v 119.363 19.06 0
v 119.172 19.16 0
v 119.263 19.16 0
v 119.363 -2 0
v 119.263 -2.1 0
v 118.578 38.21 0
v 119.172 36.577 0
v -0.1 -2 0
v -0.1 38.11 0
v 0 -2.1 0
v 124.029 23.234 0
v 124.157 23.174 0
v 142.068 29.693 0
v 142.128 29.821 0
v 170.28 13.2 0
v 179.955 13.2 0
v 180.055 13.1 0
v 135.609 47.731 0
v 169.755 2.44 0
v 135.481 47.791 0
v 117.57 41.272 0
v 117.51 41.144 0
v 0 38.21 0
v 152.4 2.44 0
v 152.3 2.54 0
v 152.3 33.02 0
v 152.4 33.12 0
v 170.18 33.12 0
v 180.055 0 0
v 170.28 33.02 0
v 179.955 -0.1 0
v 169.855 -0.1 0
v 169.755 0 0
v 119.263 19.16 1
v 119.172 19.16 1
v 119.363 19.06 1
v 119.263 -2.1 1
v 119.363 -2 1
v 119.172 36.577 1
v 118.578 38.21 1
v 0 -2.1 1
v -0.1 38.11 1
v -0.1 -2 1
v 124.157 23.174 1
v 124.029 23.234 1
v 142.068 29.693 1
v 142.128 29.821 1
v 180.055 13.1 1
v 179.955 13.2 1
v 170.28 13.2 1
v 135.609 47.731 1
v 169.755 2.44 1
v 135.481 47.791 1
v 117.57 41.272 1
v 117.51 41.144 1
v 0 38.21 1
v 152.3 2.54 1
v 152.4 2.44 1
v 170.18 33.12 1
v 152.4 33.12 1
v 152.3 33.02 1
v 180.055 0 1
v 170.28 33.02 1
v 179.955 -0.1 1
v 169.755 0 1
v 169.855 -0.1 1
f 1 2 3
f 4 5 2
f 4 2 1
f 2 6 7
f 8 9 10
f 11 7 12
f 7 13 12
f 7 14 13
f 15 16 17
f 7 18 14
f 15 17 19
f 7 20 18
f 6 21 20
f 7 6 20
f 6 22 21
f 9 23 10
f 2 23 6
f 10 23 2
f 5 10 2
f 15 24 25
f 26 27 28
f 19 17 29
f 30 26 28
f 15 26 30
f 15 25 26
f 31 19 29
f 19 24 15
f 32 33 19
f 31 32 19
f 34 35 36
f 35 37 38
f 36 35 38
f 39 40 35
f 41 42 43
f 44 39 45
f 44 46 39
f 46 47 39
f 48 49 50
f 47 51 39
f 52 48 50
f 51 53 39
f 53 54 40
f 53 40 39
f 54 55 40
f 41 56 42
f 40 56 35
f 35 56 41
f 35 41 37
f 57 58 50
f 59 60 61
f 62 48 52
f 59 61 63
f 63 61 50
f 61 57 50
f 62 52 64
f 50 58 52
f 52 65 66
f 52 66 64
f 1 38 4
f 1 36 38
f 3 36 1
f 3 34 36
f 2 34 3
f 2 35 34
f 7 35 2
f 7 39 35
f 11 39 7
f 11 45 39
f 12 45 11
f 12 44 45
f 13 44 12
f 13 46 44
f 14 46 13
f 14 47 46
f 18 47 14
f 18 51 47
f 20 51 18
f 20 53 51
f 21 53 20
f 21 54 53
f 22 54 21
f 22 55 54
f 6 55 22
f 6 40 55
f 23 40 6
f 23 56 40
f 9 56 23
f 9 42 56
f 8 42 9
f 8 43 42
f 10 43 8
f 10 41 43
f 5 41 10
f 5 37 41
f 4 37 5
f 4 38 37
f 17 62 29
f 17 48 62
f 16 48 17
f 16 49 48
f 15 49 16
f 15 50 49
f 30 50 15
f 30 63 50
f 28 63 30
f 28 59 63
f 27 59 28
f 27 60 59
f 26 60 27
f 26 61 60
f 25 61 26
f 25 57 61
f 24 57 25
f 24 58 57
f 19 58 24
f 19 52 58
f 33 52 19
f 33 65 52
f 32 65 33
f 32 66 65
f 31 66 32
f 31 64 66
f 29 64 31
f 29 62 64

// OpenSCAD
// file: ../../../lib/circuits/helpers.scad
function bu(u) = u * 2.54;

module breadboard_row(number, orientation="vertical") {
  children();
  if(number > 1) {
    if(orientation == "vertical") {
      translate([0,bu(1),0])
        breadboard_row(number-1, orientation=orientation) {
          children();
        }
    } else {
      translate([bu(1),0,0])
        breadboard_row(number-1, orientation=orientation){
          children();
        }
    }
  }
}
// file: ../../../lib/switches/rgb.scad
include <../variables.scad>

module rgb_row_trace_connection(width, height, xpos, ypos, rgb, connections) {
  half_width = u_mm(width)/2;
  half_height = u_mm(height)/2;
  if(connections[3] == "connect") {
    translate([1-half_width,8.875,0]){
      circle(d=0.8,$fn=40);
      offset(0.4)
        polygon(points=[[0,-0.01],[0,0.01],[u_mm(-xpos)-2, u_mm(-ypos)+0.01],[u_mm(-xpos)-2, u_mm(-ypos)-0.01]]);
    }
    translate([1-half_width,4.9,0]){
      circle(d=0.8,$fn=40);
      offset(0.4)
        polygon(points=[[0,-0.01],[0,0.01],[u_mm(-xpos)-2, u_mm(-ypos)+0.01],[u_mm(-xpos)-2, u_mm(-ypos)-0.01]]);
    }
    translate([1-half_width,3.3,0]){
      circle(d=0.8,$fn=40);
      offset(0.4)
        polygon(points=[[0,-0.01],[0,0.01],[u_mm(-xpos)-2, u_mm(-ypos)+0.01],[u_mm(-xpos)-2, u_mm(-ypos)-0.01]]);
    }
  }
  if(connections[2] == "connect") {
    translate([half_width-1,8.875,0]) {
      circle(d=0.8,$fn=40);
    }
    translate([half_width-1,4.9,0]) {
      circle(d=0.8,$fn=40);
    }
    translate([half_width-1,3.3,0]){
      circle(d=0.8,$fn=40);
    }
  }
}

module rgb_pcb_drill(width=1, height=1, rgb=true, connections=["hole","hole","hole","hole"]) {
  half_width = u_mm(width)/2;
  half_height = u_mm(height)/2;
  translate([half_width,half_height,0]) {
    if(rgb == true) {
      // LED Hole
      translate([-1.875,3.4])
        square([3.75,3]);

      // LED D
      if(connections[3] == "hole")
        translate([1.3-half_width,8,0])
          circle(d=1,$fn=40);
      if(connections[2] == "hole")
        translate([half_width-1.3,8,0])
          circle(d=1,$fn=40);

      // LED G
      if(connections[3] == "hole")
        translate([1.3-half_width,5.4,0])
          circle(d=1,$fn=40);
      if(connections[2] == "hole")
        translate([half_width-1.3,5.4,0])
          circle(d=1,$fn=40);

      // LED V
      if(connections[3] == "hole")
        translate([1.3-half_width,2.8,0])
          circle(d=1,$fn=40);
      if(connections[2] == "hole")
        translate([half_width-1.3,2.8,0])
          circle(d=1,$fn=40);
    }

    children();
  }
}

module rgb_pcb_hole_traces(width=1, height=1, rgb=true, xpos=0, ypos=0, connections=["hole","hole","hole","hole"]) {
  half_width = u_mm(width)/2;
  half_height = u_mm(height)/2;
  translate([half_width,half_height,0]) {
    if(rgb == true) {
      // LED D
      if(connections[3] == "hole")
        translate([1.3-half_width,8,0])
          circle(d=2.5,$fn=40);
      if(connections[2] == "hole")
        translate([half_width-1.3,8,0])
          circle(d=2.5,$fn=40);

      // LED G
      if(connections[3] == "hole")
        translate([1.3-half_width,5.4,0])
          circle(d=2.5,$fn=40);
      if(connections[2] == "hole")
        translate([half_width-1.3,5.4,0])
          circle(d=2.5,$fn=40);

      // LED V
      if(connections[3] == "hole")
        translate([1.3-half_width,2.8,0])
          circle(d=2.5,$fn=40);
      if(connections[2] == "hole")
        translate([half_width-1.3,2.8,0])
          circle(d=2.5,$fn=40);
    }

    children();
  }
}

module rgb_pcb_traces(width=1, height=1, rgb=true, xpos=0, ypos=0, connections=["hole","hole","hole","hole"]) {
  half_width = u_mm(width)/2;
  half_height = u_mm(height)/2;
  rgb_pcb_hole_traces(width=width, height=height, rgb=rgb, connections=connections) {
    if(rgb == true) {
      rgb_row_trace_connection(width=width, height=height, xpos=xpos, ypos=ypos, rgb=rgb, connections=connections);
      v_left = connections[3] == "none" ? 1 : half_width-5;
      // LED G
      translate([1.25,5])
        square([2,2]);
      translate([2.7,8.5,0]) {
        length = connections[2] == "none" ? 2 : half_width-3.7; 
        square([length,0.75]);
      }
      translate([2.7,6.8])
        square([0.8,2.4]);
      translate([-3.5,6.2])
        square([7,0.8]);
      translate([-3.5,6.8])
        square([0.8,2.4]);
      translate([-4-v_left,8.5,0])
        square([v_left+1,0.75]);

      // LED D
      translate([-4-v_left,4.5,0])
        square([v_left,0.8]);
      translate([-4.5,4.5,0])
        square([0.8,1.3]);
      translate([-4.5,5,0])
        square([1.3,0.8]);
      translate([2,4,0])
        square([2,0.8]);
      translate([4,4,0])
        square([0.8,1.3]);
      translate([4,4.5,0]) {
        length = connections[2] == "none" ? 0 : half_width-5; 
        square([length,0.75]);
      }
      translate([-3.375,5])
        square([2,1.1]);
      translate([1.25,3.75])
        square([2,1.1]);

      // LED V
      v_right = connections[2] == "none" ? 0 : half_width-5.25;
      translate([-4-v_left,2.9,0])
        square([v_right+v_left+8.875,0.8]);
      translate([-3.375,3.5])
        square([2,1.35]);
    }

    children();
  }
}
// file: ../../../lib/switches/base.scad
include <../variables.scad>
include <rgb.scad>

// ["top", "bottom", "left", "right"]

module switch_row_trace_connection(width, height, xpos, ypos, rgb, connections) {
  half_width = u_mm(width)/2;
  half_height = u_mm(height)/2;
  if(connections[3] == "connect") {
    translate([1-half_width,-5.5,0]){
      circle(d=0.8,$fn=40);
      offset(0.4)
        polygon(points=[[0,-0.01],[0,0.01],[u_mm(-xpos)-2, u_mm(-ypos)+0.01],[u_mm(-xpos)-2, u_mm(-ypos)-0.01]]);
    }
  }
  if(connections[2] == "connect") {
    translate([half_width-1,-5.5,0]) {
      circle(d=0.8,$fn=40);
    }
  }
}

module switch_column_trace_connection(width, height, xpos, ypos, rgb, connections, last_xpos=0, last_ypos=0) {
  half_width = u_mm(width)/2;
  half_height = u_mm(height)/2;
  if(connections[1] == "connect") {
    translate([-u_mm((width-1)/2)-0.9,half_height-1,0]) {
      circle(d=0.8,$fn=40);
      offset(0.4)
        polygon(points=[[0,-0.01],[0,0.01],[u_mm((width-1)/2),0.01],[u_mm((width-1)/2),-0.01]]);
    }
  }
  if(connections[0] == "connect") {
    y_off = u_mm(ypos-last_ypos);
    x_off = u_mm(last_xpos-xpos);
    translate([-0.875,-1-y_off-half_height,0]) {
      offset(0.4)
        polygon(points=[[-0.01+x_off,0],[0.01+x_off,0],[0.01,2+y_off],[-0.01,2+y_off]]);
      translate([x_off-0.01,0]) {
        offset(0.4)
          polygon(points=[[0,-0.01],[0,0.01],[u_mm((width-1)/2)+1,0.01],[u_mm((width-1)/2)+1,-0.01]]);
      }
    }
  }
}

module switch_base_pcb_drill(width=1, height=1, rgb=true, single=true, connections=["hole","hole","hole","hole"]) {
  half_width = u_mm(width)/2;
  half_height = u_mm(height)/2;
  rgb_pcb_drill(width=width, height=height, rgb=rgb, connections=connections) {
    // Row
    if(connections[2] == "hole")
      translate([half_width-1.3,-5.5,0])
        circle(d=1,$fn=40);
    if(connections[3] == "hole")
      translate([1.3-half_width,-5.5,0])
        circle(d=1,$fn=40);

    // Column
    if(connections[1] == "hole")
      translate([-1,half_height-1.25,0])
        circle(d=1,$fn=40);
    if(connections[0] == "hole")
      translate([-1,1.25-half_height,0])
        circle(d=1,$fn=40);

    children();
  }
}

module switch_base_pcb_traces(width=1, height=1, rgb=true, xpos=0, ypos=0, connections=["hole","hole","hole","hole"], last_xpos=0, last_ypos=0, single=true) {
  half_width = u_mm(width)/2;
  half_height = u_mm(height)/2;
  rgb_pcb_traces(width=width, height=height, rgb=rgb, xpos=xpos, ypos=ypos, connections=connections) {
    switch_row_trace_connection(width, height, xpos, ypos, rgb, connections);
    if(single && !rgb)
      switch_column_trace_connection(width, height, xpos, ypos, rgb, connections, last_xpos=last_xpos, last_ypos=last_ypos);

    // Row
    if(connections[2] == "hole")
      translate([half_width-1.3,-5.5,0])
        circle(d=2.5,$fn=40);
    if(connections[3] == "hole")
      translate([1.3-half_width,-5.5,0])
        circle(d=2.5,$fn=40);

    // Column
    if(connections[1] == "hole")
      translate([-1,half_height-1.25,0])
        circle(d=2.4,$fn=40);
    if(connections[0] == "hole")
      translate([-1,1.25-half_height,0])
        circle(d=2.4,$fn=40);

    children();
  }
}

module switch_base_pcb_traces_bottom(width=1, height=1, rgb=true, xpos=0, ypos=0, connections=["hole","hole","hole","hole"], last_xpos=0, last_ypos=0) {
  half_width = u_mm(width)/2;
  half_height = u_mm(height)/2;
  rgb_pcb_hole_traces(width=width, height=height, rgb=rgb, connections=connections) {
    switch_column_trace_connection(width, height, xpos, ypos, rgb, connections, last_xpos=last_xpos, last_ypos=last_ypos);

    // Row
    if(connections[2] == "hole")
      translate([half_width-1.3,-5.5,0])
        circle(d=2.5,$fn=40);
    if(connections[3] == "hole")
      translate([1.3-half_width,-5.5,0])
        circle(d=2.5,$fn=40);

    // Column
    if(connections[1] == "hole")
      translate([-1,half_height-1.25,0])
        circle(d=2.5,$fn=40);
    if(connections[0] == "hole")
      translate([-1,1.25-half_height,0])
        circle(d=2.5,$fn=40);

    children();
  }
}
// file: ../../../lib/switches/footprints.scad
include <../variables.scad>
include <stabilizers.scad>

module pcb_switch_outline(width=1, height=1) {
  stab_extra = width >= 2 ? 2 : 0;
  translate([0,-stab_extra])
    square([u_mm(width)+0.01, u_mm(height)+0.01+stab_extra]);
}

module pcb_switch_space_outline(width=1, height=1, style="mx", cnc=false) {
  offset = height_for_style(style);
  stab_extra = width >= 2 ? 2 : 0;
  translate([-1,-1-stab_extra,2.834-offset])
    cube([u_mm(width) + 2, u_mm(height) + 2 + stab_extra, 1.166+offset]);
  translate([u_mm(width/2),u_mm(height/2)]) {
    translate([-7.5,-7.5,1.5-offset])
      cube([15,15,5]);
    translate([-7,-7,-10])
      cube([14,14,10]);
    translate([u_mm(-width/2)-0.5,u_mm(-height/2)-0.5,-20-offset])
      cube([u_mm(width)+1,u_mm(height)+1, 20]);
  }
  translate([hole_offset(width), hole_offset(height),-10])
    stab(width);
}
// file: ../../../lib/switches/stabilizers.scad
module stab_hole_render(distance){
  translate([14+distance+3.375,6.99,0]) {
    circle(d=3.175, $fn=40);
    translate([0,-15.24,0])
      circle(d=4.064, $fn=40);
  }
  translate([-6.75-distance+3.375,6.99,0]) {
    circle(d=3.175, $fn=40);
    translate([0,-15.24,0])
      circle(d=4.064, $fn=40);
  }
}

module stab_holes(width) {
  if (width >= 7) {
    stab_hole_render(39.6);
  } else if (width >= 6) {
    stab_hole_render(39.6);
  } else if(width >= 2) {
    stab_hole_render(1.6);
  }
}

module stab_render(distance, cnc=false, height=5.334) {
  translate([14+distance,1.47,0]){
    // Right Side Large Hole
    cube([6.75,12.3,10]);

    // Add 1/16" corner holes for milling
    if(cnc){
      translate([0.56,0.56,0])
        cylinder(h=10,d=1.59,$fn=20);
      translate([6.75-0.56,0.56,0])
        cylinder(h=10,d=1.59,$fn=20);
      translate([0.56,12.3-0.56,0])
        cylinder(h=10,d=1.59,$fn=20);
      translate([6.75-0.56,12.3-0.56,0])
        cylinder(h=10,d=1.59,$fn=20);
    }
    translate([5.75,3.23,0]){
      // Side hole for notch
      cube([1.825,3.175,10]);
      translate([1.825,1.59,0])
        if(cnc)
          resize([1.59,3.175,10])
            cylinder(h=10,d=1.59,$fn=20);
    }
    translate([1.725,11.3,0]){
      // Top Notch
      cube([3.3,2.2,10]);
      if(cnc)
        translate([1.65,2.2,0])
          resize([3.3,1,10])
            cylinder(h=10,d=1,$fn=20);
    }
    // Thin out for clip
    translate([-1,-1,10-height+1.5])
      cube([8.75,14.3,height-1.5]);
  }
  translate([-6.75-distance,1.47,0]){
    // Left Side Large Hole
    cube([6.75,12.3,10]);
    translate([-0.825,3.23,0]){
      // Side hole for notch
      cube([1.825,3.175,10]);
      if(cnc)
        translate([0,1.59,0])
          resize([1.59,3.175,10])
            cylinder(h=10,d=1.59,$fn=20);

    }
    translate([1.725,11.3,0]){
      // Top Notch
      cube([3.3,2.2,10]);
      if(cnc)
        translate([1.65,2.2,0])
          resize([3.3,1,10])
            cylinder(h=10,d=1,$fn=20);
    }
    if(cnc){
      translate([0.56,0.56,0])
        cylinder(h=10,d=1.59,$fn=20);
      translate([6.75-0.56,0.56,0])
        cylinder(h=10,d=1.59,$fn=20);
      translate([0.56,12.3-0.56,0])
        cylinder(h=10,d=1.59,$fn=20);
      translate([6.75-0.56,12.3-0.56,0])
        cylinder(h=10,d=1.59,$fn=20);
    }
    // Thin out for clip
    translate([-1,-1,10-height+1.5])
      cube([8.75,14.3,height-1.5]);
  }
  // Center shaft for bar
  translate([-distance-2,4.7,0]){
    cube([distance*2+20,4.6,10]);
  }
}

module stab(key_width, cnc=false) {
  if (key_width >= 7) {
    stab_render(39.6, cnc=cnc);
  } else if (key_width >= 6) {
    stab_render(39.6, cnc=cnc);
  } else if(key_width >= 2) {
    stab_render(1.6, cnc=cnc);
  }
}
// file: ../../../lib/circuits/wire.scad
module guage(guage=12) {
  fn=20;
  if(guage == 8) {
    circle(d=3.25, $fn=fn);
  } else if (guage == 10) {
    circle(d=2.59, $fn=fn);
  } else if (guage == 12) {
    circle(d=2.06, $fn=fn);
  } else if (guage == 14) {
    circle(d=1.57, $fn=fn);
  } else if (guage == 16) {
    circle(d=1.3, $fn=fn);
  }
}

module wire_pcb_drill(guage=12) {
  offset(0.1)
    guage(guage);
}

module wire_pcb_traces(guage=12) {
  offset(0.75)
    guage(guage);
}

module wire_pcb_outline(guage=12) {
  offset(1.5)
    guage(guage);
}

module wire_space_outline(guage=12) {
  linear_extrude(10)
    offset(0.1)
      guage(guage);
}
// file: ../../../lib/circuits/trrs.scad
module trrs_post(d=1.2) {
  translate([0,-d/4,0]) {
    circle(d=d, $fn=20);
    translate([-d/2,0,0]) {
      square([d,(d/2-.2)]);
    }
    translate([0,(d/2-.2),0]) {
      circle(d=d, $fn=20);
    }
  }
}

module trrs_pcb_drill(side="left") {
  translate([2.8,1.5]) {
    circle(d=2, $fn=20);
  }
  translate([2.8,8.5]) {
    circle(d=2, $fn=20);
  }
  translate([0.5,11.3,0]) {
    trrs_post();
  }
  translate([5.1,3.2,0]) {
    trrs_post();
  }
  translate([5.1,6.2,0]) {
    trrs_post();
  }
  translate([5.1,10.2,0]) {
    trrs_post();
  }
  if(side != "none"){
    offset = side == "left" ? 7.6 : -2;
    translate([offset,11.3]) {
      circle(d=1.2, $fn=20);
    }
    translate([offset,8.3]) {
      circle(d=1.2, $fn=20);
    }
    translate([offset,5.3]) {
      circle(d=1.2, $fn=20);
    }
    translate([offset,2.2]) {
      circle(d=1.2, $fn=20);
    }
  }
}

module trrs_pcb_traces(side="left") {
  translate([-1,9.7,0]){
    difference() {
      square([3,3]);
      if(side == "right") {
        translate([3,-1.8]) {
          rotate(45) {
            square(2);
          }
        }
      }
    }
  }
  translate([3.6,1.2,0]){
    difference() {
      square([3,3.5]);
      if(side == "left") {
        translate([3,2.3]) {
          rotate(45) {
            square(2);
          }
        }
      }
    }
  }
  translate([3.6,4.8,0]){
    difference() {
        square([3,3.5]);
        if(side == "left") {
          translate([3,2.3]) {
            rotate(45) {
              square(2);
            }
          }
        }
    }
  }
  translate([3.6,8.4,0]){
    difference() {
      square([3,3.2]);
      if(side == "left") {
        translate([3,1.8]) {
          rotate(45) {
            square(2);
          }
        }
      }
    }
  }
  if(side != "none"){
    translate([side == "left" ? 7.6 : -2,0,0]){
      translate([0,11.3]) {
        circle(d=3, $fn=20);
      }
      translate([0,8.3]) {
        circle(d=2.9, $fn=20);
      }
      translate([0,5.3]) {
        circle(d=3, $fn=20);
      }
      translate([0,2.2]) {
        circle(d=3, $fn=20);
      }
    }
    translate([side == "left" ? 5.6 : -2,0,0]){
      left_trace = side == "left" ? 2.5 : 7.6;
      translate([0,2.2]) {
        square([left_trace,1.5]);
      }
      translate([0,5.1]) {
        square([left_trace,1.5]);
      }
      if(side == "left") {
        translate([0,8.7]) {
          square([left_trace,0.9]);
        }
      }
      else {
        translate([0,8]) {
          square([4,1.6]);
        }
        translate([4,9]) {
          square([4,1.6]);
        }
        translate([2.8,9.4]) {
          rotate(-45) {
            square([1,1.7]);
          }
        }
      }
    }
    translate([side == "left" ? 0.5 : -2,0,0]){
      right_trace = side == "left" ? 7.1 : 2;
      translate([0,11.7]) {
        square([right_trace,1.3]);
      }
      translate([0,12]) {
        circle(1, $fn=20);
      }
      translate([right_trace,11.8]) {
        circle(1, $fn=20);
      }
    }
  }
}

module trrs_pcb_outline(side="left") {
  translate([-1,0,0]) {
    square([7.6,13.1]);
  }
  if(side != "none"){
    translate([side == "left" ? 5.6 : -3.5, 0]) {
      square([4,13.1]);
    }
  }
}

module trrs_space_outline(side="left") {
  translate([0,0,-5.3]) {
    linear_extrude(7){
      translate([-2,-1,0])
        square([9.6,15.1]);
      translate([0,-12.1,0])
        square([5.6,12.1]);
      if(side != "none")
        translate([side == "left" ? 5.6 : -4.5, -1])
          square([5,15.1]);
    }
  }
  translate([3,-2,-2.6]) {
    rotate([90,0,0]) {
      cylinder(d=10, h=30, $fn=100);
    }
  }
}
// file: ../../../lib/circuits/trace.scad
function vdef(vector, index) = len(vector) == index ? vector[index-1] : vector[index];
function vadd(vector, index, axis) = vdef(vector, index)[axis] > vdef(vector, index-1)[axis] ? 0.01 : -0.01;
function polygon_from_vector(vector) = 
  len(vector) > 0 ?
    concat(vector, 
      [for (i = [1:len(vector)]) 
        [vector[len(vector)-i][0]-vadd(vector, i, 0),vector[len(vector)-i][1]-vadd(vector, i, 1)]])
      : [];

function parse_loc(loc) = [
  loc[5],
  len(loc) < 7 ? "both" : loc[6],
  len(loc) < 8 ? "none" : loc[7],
];

module manual_trace_pcb_drill(location) {
  vector = parse_loc(location)[0];
  echo("holes", parse_loc(location)[2]);
  if(parse_loc(location)[2] == "holes" || parse_loc(location)[2] == "hole_begin") {
    translate(vector[0]) {
      circle(d=1, $fn=20);
    }
  }
  if(parse_loc(location)[2] == "holes" || parse_loc(location)[2] == "hole_end") {
    translate(vector[len(vector)-1]) {
      circle(d=1, $fn=20);
    }
  }
}

module manual_trace_pcb_traces(location) {
  vector = parse_loc(location)[0];
  if(parse_loc(location)[1] != "bottom") {
    offset(0.4) {
      polygon(points=polygon_from_vector(vector));
    }
  }
  if(parse_loc(location)[2] == "holes" || parse_loc(location)[2] == "hole_begin") {
    translate(vector[0]) {
      circle(d=2.5, $fn=20);
    }
  }
  if(parse_loc(location)[2] == "holes" || parse_loc(location)[2] == "hole_end") {
    translate(vector[len(vector)-1]) {
      circle(d=2.5, $fn=20);
    }
  }
}

module manual_trace_pcb_traces_bottom(location) {
  vector = parse_loc(location)[0];
  if(parse_loc(location)[1] != "top") {
    offset(0.4) {
      polygon(points=polygon_from_vector(vector));
    }
  }
  if(parse_loc(location)[2] == "holes" || parse_loc(location)[2] == "hole_begin") {
    translate(vector[0]) {
      circle(d=2.5, $fn=20);
    }
  }
  if(parse_loc(location)[2] == "holes" || parse_loc(location)[2] == "hole_end") {
    translate(vector[len(vector)-1]) {
      circle(d=2.5, $fn=20);
    }
  }
}

module manual_trace_pcb_outline(location) {
  vector = parse_loc(location)[0];
  echo("location", location);
  offset(1)
    polygon(points=polygon_from_vector(vector));

  if(parse_loc(location)[2] == "holes" || parse_loc(location)[2] == "hole_begin") {
    translate(vector[0]) {
      circle(d=4, $fn=20);
    }
  }
  if(parse_loc(location)[2] == "holes" || parse_loc(location)[2] == "hole_end") {
    translate(vector[len(vector)-1]) {
      circle(d=4, $fn=20);
    }
  }
}

module manual_trace_space_outline(location) {
  vector = parse_loc(location)[0];
  translate([0,0,-1])
    linear_extrude(2)
      offset(0.5)
        manual_trace_pcb_outline(vector);
}
// file: ../../../lib/circuits/support.scad
module support_pcb_drill(mm=2) {
  offset(0.1)
    circle(d=mm, $fn=20);
}

module support_pcb_traces(mm=2) {
}

module support_pcb_outline(mm=2) {
  offset(2)
    circle(d=mm, $fn=20);
}

module support_space_outline(mm=2) {
  linear_extrude(10)
    offset(0.1)
      circle(d=mm, $fn=20);
}
// file: ../../../lib/circuits/proton_c.scad
use <helpers.scad>

module proton_c_pcb_drill(size="full") {
  translate([bu(0.5),bu(1.5),0]) {
    translate([0,bu(1)])
      breadboard_row(4, "horizontal"){
        circle(d=1, $fn=20);
        translate([0,bu(1)])
          circle(d=1, $fn=20);
      }
    translate([bu(4),bu(1)])
      breadboard_row(2)
        circle(d=1, $fn=20);
    translate([bu(4),bu(3)])
      breadboard_row(2)
        circle(d=1, $fn=20);
    circle(d=1, $fn=20);
    translate([bu(1),0,0])
      circle(d=1, $fn=20);
    translate([bu(5),0,0])
      circle(d=1, $fn=20);
    translate([bu(6),0,0])
      circle(d=1, $fn=20);
    breadboard_row(12) {
      circle(d=1, $fn=20);
      translate([bu(1),0,0])
        circle(d=1, $fn=20);
      translate([bu(5),0,0])
        circle(d=1, $fn=20);
      translate([bu(6),0,0])
        circle(d=1, $fn=20);
    }
    if(size == "full")
      translate([0,bu(13)])
        breadboard_row(6) {
          circle(d=1, $fn=20);
          translate([bu(1),0,0])
            circle(d=1, $fn=20);
          translate([bu(5),0,0])
            circle(d=1, $fn=20);
          translate([bu(6),0,0])
            circle(d=1, $fn=20);
    }
  }
}

module proton_c_pcb_traces(size="full") {
  translate([bu(0.5),bu(1.5),0]) {
    translate([0,bu(1)])
      breadboard_row(4, "horizontal"){
        circle(d=2.4, $fn=20);
        translate([-1,0])
          square([2,bu(1)]);
        translate([0,bu(1)])
          circle(d=2.4, $fn=20);
      }
    translate([0,bu(1)])
      breadboard_row(2) {
        translate([bu(5),0])
          circle(d=2.4, $fn=20);
        translate([bu(5),-1,0])
          square([bu(1),2]);
        translate([bu(6),0,0])
          circle(d=2.4, $fn=20);
      }
    translate([bu(4),bu(1)]){
      translate([-0.75,-1])
        square([1.5,bu(2)-2]);
      breadboard_row(2)
        circle(d=2.4, $fn=20);
      translate([0,-0.75])
        square([bu(2),1.5]);
    }
    translate([bu(4),bu(3)]){
      translate([-0.75,-1])
        square([1.5,bu(2)-2]);
      breadboard_row(2)
        circle(d=2.4, $fn=20);
      translate([0,-0.75])
        square([bu(2),1.5]);
    }
    circle(d=2.4, $fn=20);
    translate([0,-1,0])
      square([bu(1),2]);
    translate([bu(1),0,0])
      circle(d=2.4, $fn=20);
    translate([bu(5),0])
      circle(d=2.4, $fn=20);
    translate([bu(5),-1,0])
      square([bu(1),2]);
    translate([bu(6),0,0])
      circle(d=2.4, $fn=20);
    translate([0,bu(3)])
      breadboard_row(9) {
        circle(d=2.4, $fn=20);
        translate([0,-1,0])
          square([bu(1),2]);
        translate([bu(1),0,0])
          circle(d=2.4, $fn=20);
        translate([bu(5),0])
          circle(d=2.4, $fn=20);
        translate([bu(5),-1,0])
          square([bu(1),2]);
        translate([bu(6),0,0])
          circle(d=2.4, $fn=20);
      }
    if(size == "full")
      translate([0,bu(13)])
        breadboard_row(6) {
          circle(d=2.4, $fn=20);
          translate([0,-1,0])
            square([bu(1),2]);
          translate([bu(1),0,0])
            circle(d=2.4, $fn=20);
          translate([bu(5),0])
            circle(d=2.4, $fn=20);
          translate([bu(5),-1,0])
            square([bu(1),2]);
          translate([bu(6),0,0])
            circle(d=2.4, $fn=20);
        }
  }
}

module proton_c_pcb_outline(size="full") {
  translate([0,bu(1)])
  square([bu(7), bu(size == "full" ? 19 : 12)]);
}

module proton_c_space_outline(size="full") {
  translate([0,0,-4]) {
    linear_extrude(6) {
      translate([-bu(0.5),-bu(0.5)])
        square([bu(8), bu(size == "full" ? 21 : 14)]);
    }
    linear_extrude(5) {
      translate([bu(0.5),-bu(15),0])
        square([bu(6),bu(25)]);
    }
  }
}
// file: ../../../lib/circuits/pro_micro.scad
use <helpers.scad>

module pro_micro_pcb_drill(connections="holes") {
  translate([bu(0.5),bu(1.5),0]) {
    if(connections == "holes"){
      translate([bu(3),bu(1)])
        breadboard_row(3)
          circle(d=1, $fn=20);
      translate([bu(4),bu(3)])
        breadboard_row(3)
          circle(d=1, $fn=20);
    }
    breadboard_row(12) {
      circle(d=1, $fn=20);
      if(connections == "holes") {
        translate([bu(1),0,0])
          circle(d=1, $fn=20);
        translate([bu(5),0,0])
          circle(d=1, $fn=20);
      }
      translate([bu(6),0,0])
        circle(d=1, $fn=20);
    }
  }
}

module pro_micro_pcb_traces(connections="holes") {
  translate([bu(0.5),bu(1.5),0]) {
    // GRND
    if(connections == "holes"){
      translate([bu(3),bu(1)]){
        translate([-0.75,-1])
          square([1.5,bu(3)-2]);
        breadboard_row(3)
          circle(d=2.4, $fn=20);
        translate([0,-0.75])
          square([bu(2),1.5]);
      }
      translate([bu(4),bu(3)]){
        translate([-0.75,-1])
          square([1.5,bu(3)-2]);
        breadboard_row(3)
          circle(d=2.4, $fn=20);
        translate([0,-0.75])
          square([bu(2),1.5]);
      }
    }
    breadboard_row(12) {
      circle(d=2.4, $fn=20);
      if(connections == "holes") {
        translate([0,-1,0])
          square([bu(1),2]);
        translate([bu(1),0,0])
          circle(d=2.4, $fn=20);
        translate([bu(5),0])  
          circle(d=2.4, $fn=20);
        translate([bu(5),-1,0])
          square([bu(1),2]);
      }
      translate([bu(6),0,0])
        circle(d=2.4, $fn=20);
    }
  }
}

module pro_micro_pcb_outline() {
  translate([0,bu(1)])
  square([bu(7), bu(12)]);
}

module pro_micro_space_outline() {
  translate([0,0,-4]) {
    linear_extrude(6) {
      translate([-bu(0.5),-bu(0.5)])
        square([bu(8), bu(14)]);
    }
    linear_extrude(5) {
      translate([bu(0.5),-bu(15),0])
        square([bu(6),bu(25)]);
    }
  }
}
// file: ../../../lib/circuits/mts_101.scad
use <../variables.scad>
module mts_101_pcb_drill() {
  translate([0,1.25]) {
    translate([2.5,0])
      square([3,1]);
    translate([1.25,0.5])
      circle(d=1,$fn=40);
    translate([6.75,0.5])
      circle(d=1,$fn=40);

    translate([2.5,4.75])
      square([3,1]);
    translate([1.25,5.25])
      circle(d=1,$fn=40);
    translate([6.75,5.25])
      circle(d=1,$fn=40);

    translate([4,10])
      circle(d=1,$fn=40);
    translate([1.25,10])
      circle(d=1,$fn=40);
    translate([6.75,10])
      circle(d=1,$fn=40);
  }
}

module mts_101_pcb_traces() {
  translate([0,1.25]) {
    translate([2,-0.5])
      square([4,2]);
    translate([1.25,0.5])
      circle(d=2,$fn=40);
    translate([6.75,0.5])
      circle(d=2,$fn=40);

    translate([2,4.25])
      square([4,2]);
    translate([1.25,5.25])
      circle(d=2,$fn=40);
    translate([6.75,5.25])
      circle(d=2,$fn=40);

    translate([4,10])
      circle(d=2,$fn=40);
    translate([1.25,9.5])
      square([6,1]);
    translate([1.25,10])
      circle(d=2,$fn=40);
    translate([6.75,10])
      circle(d=2,$fn=40);
  }
}

module mts_101_pcb_outline() {
  square([8,13]);
}

module mts_101_space_outline(, cnc=false) {
  translate([-0.5,-0.5,-10])
    cube([9,14, 14.4]);
  translate([4,6.5,-26]) {
    cylinder(d=6, h=18, $fn=30);
    cylinder(d=12, h=10, $fn=60);
  }
}
// file: ../../../lib/circuits/ec11.scad
use <../variables.scad>
use <../switches/base.scad>

module 1u_centered() {
  translate([u_mm(0.5),u_mm(0.5)])
    children();
}

module ec11_pcb_drill(single=false, connections=["hole","hole","hole","hole"]) {
  switch_base_pcb_drill(rgb=false, connections=connections) {
    // Key Column
    translate([-3,0,0])
      circle(d=1,$fn=40);

    // Key Row
    translate([7,2.5])
      circle(d=1, $fn=20);

    if(single) {
      translate([4.25,-3,0])
        circle(d=1, $fn=20);
      translate([-3,-3.25,0])
        circle(d=1,$fn=40);
    }
    translate([4.25,0,0])
      circle(d=1, $fn=20);

    translate([7,-2.5])
      circle(d=1, $fn=20);

    if(connections[3] == "hole"){
      translate([-5.5,2.5])
        circle(d=1, $fn=20);
      translate([-5.5,0])
        circle(d=1, $fn=20);
      translate([-5.5,-2.5])
        circle(d=1, $fn=20);
    }
    translate([-7.5,-2.5])
      circle(d=1, $fn=20);
    translate([-7.5,2.5])
      circle(d=1, $fn=20);
    translate([-7.5,0])
      circle(d=1, $fn=20);

    translate([-1.3,-6.25])
      square([2.6,1.5]);
    translate([-1.3,4.75])
      square([2.6,1.5]);
  }
}

module ec11_pcb_traces(single=false, connections=["hole","hole","hole","hole"]) {
  switch_base_pcb_traces(single=single, rgb=false, connections=connections) {
    // Key Row
    if(single){
      translate([2,2.2])
        square([4.5,0.8]);
      r_len = connections[0] != "none" ? u_mm(0.5)-1 : 6;
      l_len = connections[1] != "none" ? u_mm(0.5)-1 : 6;
      translate([2,-r_len])
        square([0.8,r_len+l_len]);
      if(connections[0] != "none")
        translate([-2,1-u_mm(0.5)])
          square([4,0.8]);
      if(connections[1] != "none")
        translate([-2.1,u_mm(0.5)-1.6])
          square([4.9,0.8]);
    }
    translate([7,2.5])
      circle(d=2.5,$fn=40);

    // Key Column
    if(connections[3] != "none")
      translate([1-u_mm(0.5),-6])
        square([u_mm(0.5)-4,1]);
    translate([-3.25,-6])
      square([0.8,5]);
    translate([-3,0])
      circle(d=2.5,$fn=40);

    if(single){
      translate([-3,-3.25])
        circle(d=2.5,$fn=40);
      translate([4.25,-3])
        circle(d=2.5,$fn=40);
    } else {
      translate([-3,-3.25])
        square([7.8,0.8]);
    }

    translate([7,-2.5])
      circle(d=2.5,$fn=40);
    translate([4.25,0]) {
      circle(d=2.5,$fn=40);
      rotate(-45)
        square([5,0.8]);
    }

    translate([4,-6])
      square([0.8,3]);
    if(connections[2] != "none")
      translate([4,-6])
        square([4.5,0.8]);

    if(connections[3] == "hole"){
      translate([-5.5,2.5])
        circle(d=2.25, $fn=20);
      translate([-5.5,0])
        circle(d=2.25, $fn=20);
      translate([-5.5,-2.5])
        circle(d=2.25, $fn=20);
    }
    translate([-7.5,-2.5])
      circle(d=2.25, $fn=20);
    translate([-7.5,2.5])
      circle(d=2.25, $fn=20);
    translate([-7.5,0])
      circle(d=2.25, $fn=20);
  }
}

module ec11_pcb_traces_bottom(connections=["hole","hole","hole","hole"]) {
  switch_base_pcb_traces_bottom(rgb=false, connections=connections) {
    // Key Row
    translate([2,2.2])
      square([4.5,0.8]);
    r_len = connections[0] != "none" ? u_mm(0.5)-1 : 6;
    l_len = connections[1] != "none" ? u_mm(0.5)-1 : 6;
    translate([2,-r_len])
      square([0.8,r_len+l_len]);
    
    if(connections[0] != "none")
      translate([-1.3,1-u_mm(0.5)])
        square([4,0.8]);
    if(connections[1] != "none")
      translate([-1,u_mm(0.5)-1.4])
        square([3.8,0.8]);
    translate([7,2.5])
      circle(d=2.5,$fn=40);

    // Key Column
    translate([-3,0])
      circle(d=2.5,$fn=40);

    translate([7,-2.5])
      circle(d=2.5,$fn=40);
    translate([4.25,0]) {
      circle(d=2.5,$fn=40);
    }

    if(connections[3] == "hole"){
      translate([-5.5,2.5])
        circle(d=2.25, $fn=20);
      translate([-5.5,0])
        circle(d=2.25, $fn=20);
      translate([-5.5,-2.5])
        circle(d=2.25, $fn=20);
    }
    translate([-7.5,-2.5])
      circle(d=2.25, $fn=20);
    translate([-7.5,2.5])
      circle(d=2.25, $fn=20);
    translate([-7.5,0])
      circle(d=2.25, $fn=20);
  }
}

module ec11_pcb_outline() {
  square([u_mm(1), u_mm(1)]);
}

module ec11_space_outline() {
  translate([-0.5,-0.5, -6])
    cube([u_mm(1)+1, u_mm(1)+1, 8]);
  1u_centered() {
    translate([0,0,-15])
      linear_extrude(15)
        circle(d=7, $fn=30);
    translate([0,0,-25])
      linear_extrude(15)
        circle(d=19, $fn=80);
  }
}
// file: ../../../lib/switches/choc_v1.scad
include <../variables.scad>
include <stabilizers.scad>
include <footprints.scad>

module switch_choc_v1_pcb_drill(width=1, height=1) {
  half_width = u_mm(width)/2;
  half_height = u_mm(height)/2;
  translate([half_width,half_height,0]) {
    circle(d=3.5, $fn=30);

    translate([-5.5,0])
      circle(d=2, $fn=30);
    translate([3,3.8])
      circle(d=1, $fn=30);
    translate([-4, 3.8])
      circle(d=1, $fn=30);
    translate([-4,1.25-half_height])
      circle(d=1, $fn=30);
    translate([-4, half_height-3])
      circle(d=1, $fn=30);

    translate([5.5,0])
      circle(d=2, $fn=30);
    translate([0,5.9])
      circle(d=1.3, $fn=30);
    translate([5,3.8])
      circle(d=1.3, $fn=30);
    translate([1-half_width, half_height-1])
      circle(d=1, $fn=30);
    translate([half_width-1, half_height-1])
      circle(d=1, $fn=30);
  }
}

module switch_choc_v1_pcb_traces(width=1, height=1) {
  half_width = u_mm(width)/2;
  half_height = u_mm(height)/2;
  translate([half_width,half_height,0]) {
    translate([5,3.8])
      circle(d=2.8, $fn=30);
    translate([3,3.8])
      circle(d=2.5, $fn=30);
    translate([-4, 3.8])
      circle(d=2.5, $fn=30);
    translate([-4.5, 2-half_height])
      square([1, u_mm(height)-4]);
    translate([-4,1.25-half_height])
      circle(d=2.5, $fn=30);
    translate([-4, half_height-3])
      circle(d=2.5, $fn=30);

    translate([0,5.9])
      circle(d=2.8, $fn=30);
    translate([-0.5, 5.9])
      square([1, half_height-6.9]);
    translate([1-half_width, half_height-1.5])
      square([half_width*2-2, 1]);
    translate([1-half_width, half_height-1])
      circle(d=2.5, $fn=30);
    translate([half_width-1, half_height-1])
      circle(d=2.5, $fn=30);
  }
}

module switch_choc_v1_pcb_outline(width=1, height=1) {
  pcb_switch_outline(width=width, height=height);
}
// file: ../../../lib/switches/mx.scad
include <../variables.scad>
include <stabilizers.scad>
include <footprints.scad>
include <base.scad>
include <rgb.scad>

module switch_mx_pcb_drill(width=1, height=1, rgb=true, single=true, connections=["hole","hole","hole","hole"]) {
  half_width = u_mm(width)/2;
  half_height = u_mm(height)/2;
  translate([hole_offset(width), half_height]) {
    stab_holes(width);
  }

  switch_base_pcb_drill(width=width, height=height, single=single, rgb=rgb, connections=connections) {
    circle(d=4,$fn=40);
    translate([-3.8,-2.5,0])
      circle(d=1.7,$fn=40);
    translate([2.5,-5,0])
      circle(d=1.7,$fn=40);
    translate([5,0,0])
      circle(d=1.75,$fn=40);
    translate([-5,0,0])
      circle(d=1.75,$fn=40);

    // Column
    translate([-1.2,-3,0])
      circle(d=1,$fn=40);
    translate([5,-2,0])
      circle(d=1,$fn=40);
    if(single){
      translate([6,-3.7,0])
        circle(d=1,$fn=40);
      if(rgb) {
        translate([5,1.7,0])
          circle(d=1,$fn=40);
      } else {
        translate([6,-8.3,0])
          circle(d=1,$fn=40);
      }
    }
  }
}

module switch_mx_pcb_traces(width=1, height=1, rgb=true, single=true, xpos=0, ypos=0, connections=["hole","hole","hole","hole"], last_xpos=0, last_ypos=0) {
  half_width = u_mm(width)/2;
  half_height = u_mm(height)/2;
  switch_base_pcb_traces(width=width, height=height, rgb=rgb, xpos=xpos, ypos=ypos, connections=connections, last_xpos=last_xpos, last_ypos=last_ypos, single=single) {
    translate([-3.8,-2.5,0])
      circle(d=4,$fn=40);
    translate([2.5,-5,0])
      circle(d=4,$fn=40);

    // Row
    v_left = connections[3] == "none" ? 1 : half_width;
    v_right = connections[2] == "none" ? 1 : half_width-5;
    translate([1-v_left,-5.9,0])
      square([v_left+v_right+3,0.8]);

    // Column
    translate([-1.2,-3,0])
      circle(d=2.5,$fn=40);
    translate([5,-2,0])
      circle(d=2.5,$fn=40);
    if(single){
      translate([6,-3.7,0])
        circle(d=2.5,$fn=40);
      difference() {
        translate([5,0,0])
          circle(d=3.55,$fn=40);
        translate([5,-2,0])
          square(4);
      }
      if(rgb) {
        translate([5,1.7,0])
          circle(d=2.3,$fn=40);
      } else {
        translate([4.2,1])
          square([0.8, half_height-2]);
        translate([-1,half_height-1.5])
          square([6,0.8]);
        translate([6,-8.3,0])
          circle(d=2.5,$fn=40);
        translate([-1.3,-8.7,0])
          square([7,0.8]);
      }
    }
  }
}

module switch_mx_pcb_traces_bottom(width=1, height=1, rgb=true, xpos=0, ypos=0, connections=["hole","hole","hole","hole"], last_xpos=0, last_ypos=0) {
  half_width = u_mm(width)/2;
  half_height = u_mm(height)/2;
  switch_base_pcb_traces_bottom(width=width, height=height, rgb=rgb, xpos=xpos, ypos=ypos, connections=connections, last_xpos=last_xpos, last_ypos=last_ypos) {
    translate([-3.8,-2.5,0])
      circle(d=4,$fn=40);
    translate([2.5,-5,0])
      circle(d=4,$fn=40);

    // Column
    translate([-1.2,-3,0])
      circle(d=2.5,$fn=40);
    translate([5,-2,0])
      circle(d=2.5,$fn=40);
    difference(){
      translate([2.5,-5,0])
        circle(d=5.9,$fn=40);
      translate([2.5,-5,0])
        circle(d=4.1,$fn=40);
      translate([0.3,-7,0])
        rotate(45)
          square(6);
    }
    translate([3.85,-3.45])
      square([0.8, 1]);

    t_height = connections[0] == "none" ? 1 : half_height-7.8;
    echo("h", 2-half_height, t_height);
    translate([-1.3,-t_height-6.8])
      square([0.8, t_height]);
    translate([-1.3,-7.2])
      square([2.2,0.8]);
    difference() {
      translate([5,0,0])
        circle(d=3.35,$fn=40);
      translate([5,-2,0])
        square(4);
    }
    b_height = connections[1] == "none" ? 2 : half_height-2;
    translate([4.2,1])
      square([0.8, b_height]);
    if(connections[1] != "none")
      translate([-1,half_height-1.5])
        square([6,0.8]);
  }
}

module switch_mx_pcb_outline(width=1, height=1) {
  pcb_switch_outline(width=width, height=height);
}
// file: ../../../lib/utilities.scad
function reverse(list) = len(list) > 0 ? [for (i = [1:len(list)]) list[len(list)-i]] : [];
function pop(list) = len(list) > 0 ? [for (i = [0:len(list)-1]) if (i != 0) list[i]] : [];
// file: ../../../lib/switches.scad
use <utilities.scad>
include <switches/mx.scad>
include <switches/choc_v1.scad>

module rotate_translate(rotation, xpos, ypos) {
  if(rotation[0] == undef || rotation[0] == 0) {
    translate([u_mm(xpos), u_mm(ypos), 0]) {
      children();
    }
  } else {
    xoff = rotation[1] == undef ? 0 : rotation[1];
    yoff = rotation[2] == undef ? 0 : rotation[2];
    angle = rotation[0] == undef ? 0 : rotation[0];
    translate([u_mm(xpos - xoff), u_mm(ypos - yoff), 0])
      rotate(angle)
        translate([u_mm(xoff), u_mm(yoff), 0])
          children();
  }
}

module switch(type, style="mx", rgb=true, xpos=0, ypos=0, width=1, cnc=false, rotation=[0,0,0], connections=["hole","hole","hole","hole"], last_xpos=0, last_ypos=0) {
  rotate_translate(rotation, xpos, ypos) {
    if(type == "outline")
      pcb_switch_outline(width=width);
    if(style == "mx") {
      if(type == "key")
        pcb_switch_space_outline(width=width, cnc=cnc, style="mx");
      if(type == "traces")
        switch_mx_pcb_traces(width=width, rgb=rgb, xpos=xpos, ypos=ypos, connections=connections, last_xpos=last_xpos, last_ypos=last_ypos);
      if(type == "traces_top")
        switch_mx_pcb_traces(width=width, single=false, rgb=rgb, xpos=xpos, ypos=ypos, connections=connections, last_xpos=last_xpos, last_ypos=last_ypos);
      if(type == "traces_bottom")
        switch_mx_pcb_traces_bottom(width=width, rgb=rgb, xpos=xpos, ypos=ypos, connections=connections, last_xpos=last_xpos, last_ypos=last_ypos);
      if(type == "drill")
        switch_mx_pcb_drill(width=width, rgb=rgb, connections=connections);
      if(type == "drill_double")
        switch_mx_pcb_drill(width=width, single=false, rgb=rgb, connections=connections);
    }

    if(style == "choc_v1") {
      if(type == "key")
        pcb_switch_space_outline(width=width, cnc=cnc, style="choc_v1");
      if(type == "traces")
        switch_choc_v1_pcb_traces(width=width);
      if(type == "traces_top")
        switch_choc_v1_pcb_traces(width=width);
      if(type == "traces_bottom")
        assert(false, "traces_bottom is incompatible with choc_v1");
      if(type == "drill")
        switch_choc_v1_pcb_drill(width=width);
      if(type == "drill_double")
        switch_choc_v1_pcb_drill(width=width, single=false);
    }

    if(style == "redragon") {
      if(type == "key")
        pcb_switch_space_outline(width=width, cnc=cnc, style="redragon");
      if(type == "traces")
        switch_mx_pcb_traces(width=width, rgb=rgb);
      if(type == "traces_top")
        switch_mx_pcb_traces(width=width, single=false, rgb=rgb);
      if(type == "traces_bottom")
        switch_mx_pcb_traces_bottom(width=width, rgb=rgb);
      if(type == "traces")
        switch_mx_pcb_traces(width=width, rgb=rgb);
      if(type == "drill")
        switch_mx_pcb_drill(width=width);
      if(type == "drill_double")
        switch_mx_pcb_drill(width=width, single=false);
    }
  }
}

module switch_row(keys, style="mx", rgb=true, margin=5, thickness=10, depth=0, cnc=false, type="key", last_row=[], last_xpos=0, previous_xpos=0, last_ypos=0, previous_ypos=0) {
  width = keys[0][0] == undef ? 1 : keys[0][0];
  xpos = keys[0][1] == undef ? 0 : keys[0][1];
  ypos = keys[0][2] == undef ? 0 : keys[0][2];
  rotation = keys[0][3] == undef ? [0,0,0] : keys[0][3];
  connections = keys[0][4] == undef ? ["hole","hole","hole","hole"] : keys[0][4];
  last_ypos = last_row[0][2] == undef ? last_ypos - previous_ypos : last_row[0][2]+last_ypos - previous_ypos;
  last_xpos = last_row[0][1] == undef ? last_xpos - previous_xpos : last_row[0][1]+last_xpos - previous_xpos;
  switch(type, style=style, rgb=rgb, xpos=xpos, ypos=ypos, width=width, cnc=cnc, rotation=rotation, connections=connections, last_xpos=last_xpos, last_ypos=last_ypos);
  if(len(keys) > 1) {
    translate([xpos*key_size+width*key_size, ypos*key_size, 0])
      switch_row(pop(keys), style=style, rgb=rgb, margin=margin, thickness=thickness, depth=depth, cnc=cnc, type=type, last_row = pop(last_row), last_xpos=last_xpos, previous_xpos=xpos, last_ypos=last_ypos, previous_ypos=ypos);
  }
}

module switches(switches, style="mx", rgb=true, margin=5, thickness=10, depth=0, cnc=false, type="key", last_row=[]) {
  if(len(switches) != 0) {
    switch_row(switches[0], style=style, rgb=rgb, margin=margin, thickness=thickness, depth=depth, cnc=cnc, type=type, last_row=last_row);
    if(len(switches) > 1) {
      last_row = switches[0];
      translate([0, key_size, 0])
        switches(pop(switches), style=style, rgb=rgb, margin=margin, depth=depth, thickness=thickness, cnc=cnc, type=type, last_row=last_row);
    }
  }
}
// file: ../../../lib/case.scad
include <variables.scad>
use <utilities.scad>
use <circuits.scad>

function key_width(key) = (key[0] == undef ? 1 : key[0]) + (key[1] == undef ? 0 : key[1]);
function width_row(row) = len(row) == 0 ? 0 : key_width(row[0]) + width_row(pop(row));
function width_board(rows) = len(rows) == 0 ? 0 : (
  let (current = width_row(rows[0]))
  let (next = width_board(pop(rows)))
    current > next ? current : next);

function key_height(key) = (key[2] == undef ? 0 : key[2]);
function height_row(row) = len(row) == 0 ? [0,0] : (
  let(other_rows = height_row(pop(row)))
  let(current = key_height(row[0]) + other_rows[0])
  let(maximum = current > other_rows[1] ? current : other_rows[1])
  [current, maximum]);
function height_board_rec(rows) = len(rows) == 0 ? 0 : (
  let (current = height_row(reverse(rows[0]))[1])
  let (next = height_board_rec(pop(rows)))
    current > next ? current : next);
function height_board(rows) = 
  let (height_rec = height_board_rec(rows))
    len(rows) + (height_rec > 0 ? height_rec : 0);

module case(rows, style="mx", margin=5, thickness=5, depth=0, radius=2, rest=0, circuits=[], _inherit_children="unset") {
  total_thickness = thickness + depth + height_for_style(style);
  z_offset = depth + height_for_style(style);
  if($children != 0 && (_inherit_children == "unset" || _inherit_children > 0)) {
    translate([0, 0, -z_offset])
      linear_extrude(total_thickness)
        offset(margin)
          children();
  } else {
    width=u_mm(width_board(rows))+margin*2;
    height=u_mm(height_board(rows))+margin*2+rest;
    translate([-margin, -margin, -z_offset]){
      translate([radius, 0, 0])
        cube([width-radius*2, height,total_thickness]);
      translate([0, radius, 0])
        cube([width, height-radius*2,total_thickness]);
      translate([radius, radius, 0])
        cylinder(total_thickness,radius,radius, $fn=60);
      translate([width-radius, radius, 0])
        cylinder(total_thickness,radius,radius, $fn=60);
      translate([width-radius, height-radius, 0])
        cylinder(total_thickness,radius,radius, $fn=60);
      translate([radius, height-radius, 0])
        cylinder(total_thickness,radius,radius, $fn=60);
    }
    if(len(circuits) > 0)
      translate([0, 0, -z_offset])
        linear_extrude(total_thickness)
          offset(margin)
            circuits_pcb_outline(circuits);
  }
}
// file: ../../../lib/variables.scad
key_size=19.05;
hole=14;

function u_mm(u) = u*key_size;
function hole_offset(u) = (key_size-hole)/2+u_mm(u-1)/2;

// This is used to determine how much space is between the top
// of the plate and the PCB.
function height_for_style(style) = style == "mx"        ? 5.334 :
                                   style == "redragon" ? 3.75  :
                                   style == "choc_v1"   ? 2.2   :  "invalid style";
// main file
function circuit() = [[8,0,0,0,"pro_micro"],[9.1,0,0,0,"trrs_right"],[4,1,0,0,"manual_trace", [[0,0],[0,10],[10,10]]]];

function layout() = [
  [[6.26], [1,1,1,[20,1,2]]],
  [[2.25],[1.75],[1.25],[]]
];

include <../../../keyboard.scad>

linear_extrude(1)
  pcb_outline(layout=layout(), bit=0.2, circuits=circuit());
